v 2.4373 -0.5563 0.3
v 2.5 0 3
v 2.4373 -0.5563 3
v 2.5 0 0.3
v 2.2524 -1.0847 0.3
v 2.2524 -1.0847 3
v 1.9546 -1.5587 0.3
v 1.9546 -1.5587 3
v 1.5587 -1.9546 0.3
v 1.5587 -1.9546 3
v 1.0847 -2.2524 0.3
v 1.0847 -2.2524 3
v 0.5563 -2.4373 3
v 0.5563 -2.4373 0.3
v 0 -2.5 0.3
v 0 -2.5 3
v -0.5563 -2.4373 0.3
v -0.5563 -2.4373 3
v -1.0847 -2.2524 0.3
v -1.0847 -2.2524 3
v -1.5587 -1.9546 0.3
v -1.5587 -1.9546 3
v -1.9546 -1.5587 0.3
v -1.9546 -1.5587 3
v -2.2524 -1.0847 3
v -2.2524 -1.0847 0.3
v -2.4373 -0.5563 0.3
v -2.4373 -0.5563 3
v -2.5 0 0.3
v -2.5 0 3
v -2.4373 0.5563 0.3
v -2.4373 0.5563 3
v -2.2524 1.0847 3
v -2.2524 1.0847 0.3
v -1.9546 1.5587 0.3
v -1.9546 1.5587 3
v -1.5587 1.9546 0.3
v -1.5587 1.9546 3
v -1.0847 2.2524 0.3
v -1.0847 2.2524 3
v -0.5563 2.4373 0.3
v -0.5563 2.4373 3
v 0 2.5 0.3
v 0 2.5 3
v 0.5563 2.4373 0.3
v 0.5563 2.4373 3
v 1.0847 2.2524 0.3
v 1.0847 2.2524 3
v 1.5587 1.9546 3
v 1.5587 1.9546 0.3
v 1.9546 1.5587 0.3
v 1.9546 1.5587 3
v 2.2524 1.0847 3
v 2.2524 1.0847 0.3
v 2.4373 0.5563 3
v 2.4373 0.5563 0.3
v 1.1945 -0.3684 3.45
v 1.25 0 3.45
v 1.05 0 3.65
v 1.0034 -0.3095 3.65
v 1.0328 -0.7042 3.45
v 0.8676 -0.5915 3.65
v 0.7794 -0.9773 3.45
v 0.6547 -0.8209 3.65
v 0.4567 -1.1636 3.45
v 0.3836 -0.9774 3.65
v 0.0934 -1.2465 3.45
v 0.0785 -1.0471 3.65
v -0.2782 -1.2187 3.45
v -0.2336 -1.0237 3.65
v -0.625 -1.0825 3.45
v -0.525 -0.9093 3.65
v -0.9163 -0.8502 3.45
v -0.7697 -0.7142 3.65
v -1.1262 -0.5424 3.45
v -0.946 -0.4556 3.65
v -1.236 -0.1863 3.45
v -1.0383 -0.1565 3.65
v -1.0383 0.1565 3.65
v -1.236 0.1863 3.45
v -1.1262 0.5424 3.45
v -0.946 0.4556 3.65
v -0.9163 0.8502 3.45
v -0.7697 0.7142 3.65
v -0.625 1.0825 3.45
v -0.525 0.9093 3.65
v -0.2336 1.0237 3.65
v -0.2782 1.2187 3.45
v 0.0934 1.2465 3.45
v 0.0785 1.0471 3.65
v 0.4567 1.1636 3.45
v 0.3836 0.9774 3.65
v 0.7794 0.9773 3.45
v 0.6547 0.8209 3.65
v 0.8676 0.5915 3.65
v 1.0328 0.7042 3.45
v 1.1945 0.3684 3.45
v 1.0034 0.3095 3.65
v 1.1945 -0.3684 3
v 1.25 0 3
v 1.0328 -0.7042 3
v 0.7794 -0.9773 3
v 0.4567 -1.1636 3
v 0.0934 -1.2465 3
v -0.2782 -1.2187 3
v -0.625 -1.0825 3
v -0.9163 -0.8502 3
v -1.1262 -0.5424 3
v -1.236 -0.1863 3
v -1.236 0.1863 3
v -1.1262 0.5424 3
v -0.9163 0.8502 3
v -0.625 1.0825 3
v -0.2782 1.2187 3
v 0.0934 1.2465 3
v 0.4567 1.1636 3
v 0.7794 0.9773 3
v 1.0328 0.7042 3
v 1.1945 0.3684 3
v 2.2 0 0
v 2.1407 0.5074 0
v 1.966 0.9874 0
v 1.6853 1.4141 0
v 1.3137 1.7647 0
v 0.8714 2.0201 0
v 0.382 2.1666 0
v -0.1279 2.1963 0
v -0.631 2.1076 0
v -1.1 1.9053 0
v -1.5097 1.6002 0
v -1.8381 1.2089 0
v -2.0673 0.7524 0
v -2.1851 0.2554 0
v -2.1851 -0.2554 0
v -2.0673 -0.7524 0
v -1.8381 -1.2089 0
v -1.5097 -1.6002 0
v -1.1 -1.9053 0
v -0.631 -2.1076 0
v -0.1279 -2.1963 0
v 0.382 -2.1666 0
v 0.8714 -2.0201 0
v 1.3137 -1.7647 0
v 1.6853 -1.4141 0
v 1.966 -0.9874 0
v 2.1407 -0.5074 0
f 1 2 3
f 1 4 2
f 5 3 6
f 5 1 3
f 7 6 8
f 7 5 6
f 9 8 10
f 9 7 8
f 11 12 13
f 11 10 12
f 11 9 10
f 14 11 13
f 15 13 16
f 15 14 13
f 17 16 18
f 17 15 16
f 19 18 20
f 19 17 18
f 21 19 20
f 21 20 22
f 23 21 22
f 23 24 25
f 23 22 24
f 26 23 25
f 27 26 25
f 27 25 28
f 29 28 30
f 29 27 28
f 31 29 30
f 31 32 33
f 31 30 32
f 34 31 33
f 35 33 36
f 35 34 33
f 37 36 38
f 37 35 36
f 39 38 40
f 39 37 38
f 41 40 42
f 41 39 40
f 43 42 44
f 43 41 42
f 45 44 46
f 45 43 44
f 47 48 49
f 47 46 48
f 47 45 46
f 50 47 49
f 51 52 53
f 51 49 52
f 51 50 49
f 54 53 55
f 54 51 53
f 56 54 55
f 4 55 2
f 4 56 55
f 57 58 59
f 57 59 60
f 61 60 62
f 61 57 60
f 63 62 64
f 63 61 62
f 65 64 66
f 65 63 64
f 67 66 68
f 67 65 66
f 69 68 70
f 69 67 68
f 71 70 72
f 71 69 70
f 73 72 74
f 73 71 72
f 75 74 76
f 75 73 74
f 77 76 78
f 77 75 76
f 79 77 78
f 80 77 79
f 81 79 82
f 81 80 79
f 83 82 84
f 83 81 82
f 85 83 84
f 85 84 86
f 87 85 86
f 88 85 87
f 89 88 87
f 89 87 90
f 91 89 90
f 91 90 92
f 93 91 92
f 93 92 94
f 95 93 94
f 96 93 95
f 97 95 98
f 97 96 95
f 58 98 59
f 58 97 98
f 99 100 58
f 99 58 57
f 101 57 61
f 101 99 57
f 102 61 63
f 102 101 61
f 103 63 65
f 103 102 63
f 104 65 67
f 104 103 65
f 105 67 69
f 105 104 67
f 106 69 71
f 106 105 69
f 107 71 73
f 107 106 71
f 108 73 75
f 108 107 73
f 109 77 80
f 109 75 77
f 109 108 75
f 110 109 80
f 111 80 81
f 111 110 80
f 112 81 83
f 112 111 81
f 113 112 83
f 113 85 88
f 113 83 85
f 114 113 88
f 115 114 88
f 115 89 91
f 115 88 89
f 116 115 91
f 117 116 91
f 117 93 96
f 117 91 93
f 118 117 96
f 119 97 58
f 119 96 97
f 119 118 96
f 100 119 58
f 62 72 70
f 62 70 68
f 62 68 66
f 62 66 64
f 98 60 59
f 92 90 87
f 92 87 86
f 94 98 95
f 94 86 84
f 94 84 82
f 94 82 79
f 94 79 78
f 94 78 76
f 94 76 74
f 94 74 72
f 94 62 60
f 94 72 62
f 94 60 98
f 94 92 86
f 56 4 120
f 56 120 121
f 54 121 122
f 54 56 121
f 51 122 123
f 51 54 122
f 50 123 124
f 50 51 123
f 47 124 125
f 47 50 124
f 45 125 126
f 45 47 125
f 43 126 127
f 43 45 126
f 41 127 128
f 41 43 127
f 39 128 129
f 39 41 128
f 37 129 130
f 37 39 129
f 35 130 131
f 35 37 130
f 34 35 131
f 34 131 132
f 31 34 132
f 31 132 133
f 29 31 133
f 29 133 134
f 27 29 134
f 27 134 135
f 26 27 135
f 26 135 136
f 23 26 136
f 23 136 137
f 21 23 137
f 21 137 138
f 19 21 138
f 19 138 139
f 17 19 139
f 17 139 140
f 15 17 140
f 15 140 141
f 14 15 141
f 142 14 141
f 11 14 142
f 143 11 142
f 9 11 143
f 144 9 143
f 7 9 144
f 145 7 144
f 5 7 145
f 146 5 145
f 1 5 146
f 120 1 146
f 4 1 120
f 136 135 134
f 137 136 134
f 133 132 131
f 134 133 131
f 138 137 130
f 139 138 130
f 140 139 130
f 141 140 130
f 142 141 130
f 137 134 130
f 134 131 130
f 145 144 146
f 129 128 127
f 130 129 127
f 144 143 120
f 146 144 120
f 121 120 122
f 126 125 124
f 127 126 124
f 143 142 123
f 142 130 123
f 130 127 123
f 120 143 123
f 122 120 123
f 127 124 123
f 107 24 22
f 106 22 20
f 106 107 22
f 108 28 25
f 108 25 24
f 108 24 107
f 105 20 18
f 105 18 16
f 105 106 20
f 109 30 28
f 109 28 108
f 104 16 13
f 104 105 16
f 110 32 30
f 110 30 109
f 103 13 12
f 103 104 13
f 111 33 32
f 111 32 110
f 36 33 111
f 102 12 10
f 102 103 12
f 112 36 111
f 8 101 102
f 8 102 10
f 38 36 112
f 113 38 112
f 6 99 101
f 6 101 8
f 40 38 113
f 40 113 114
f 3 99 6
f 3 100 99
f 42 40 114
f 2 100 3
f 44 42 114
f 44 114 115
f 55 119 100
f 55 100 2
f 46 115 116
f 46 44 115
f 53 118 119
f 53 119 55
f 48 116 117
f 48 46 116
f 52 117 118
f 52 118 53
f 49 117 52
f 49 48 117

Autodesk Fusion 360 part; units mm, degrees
sketch "Sketch1" plane through (0, 0, 0) normal (0, 0, 1) x (1, 0, 0)
  circle A0 centre (0, 0) radius 2.5
  circle A1 centre (0, 0) radius 1.25
  dimension "d1" = 5
  dimension "d2" = 2.5
extrude "Extrude1" add sketch "Sketch1" along normal blind 3
extrude "Extrude2" add sketch "Sketch1" along normal blind 3.65 contours A1
chamfer "Chamfer1" distance 0.3 angle 45 1 edges at (-2.3308, -0.904, 0)
chamfer "Chamfer2" distance 0.2 angle 45 1 edges at (-1.1654, -0.452, 3.65)
equation "d5 = 3 mm + 0.65 mm"
